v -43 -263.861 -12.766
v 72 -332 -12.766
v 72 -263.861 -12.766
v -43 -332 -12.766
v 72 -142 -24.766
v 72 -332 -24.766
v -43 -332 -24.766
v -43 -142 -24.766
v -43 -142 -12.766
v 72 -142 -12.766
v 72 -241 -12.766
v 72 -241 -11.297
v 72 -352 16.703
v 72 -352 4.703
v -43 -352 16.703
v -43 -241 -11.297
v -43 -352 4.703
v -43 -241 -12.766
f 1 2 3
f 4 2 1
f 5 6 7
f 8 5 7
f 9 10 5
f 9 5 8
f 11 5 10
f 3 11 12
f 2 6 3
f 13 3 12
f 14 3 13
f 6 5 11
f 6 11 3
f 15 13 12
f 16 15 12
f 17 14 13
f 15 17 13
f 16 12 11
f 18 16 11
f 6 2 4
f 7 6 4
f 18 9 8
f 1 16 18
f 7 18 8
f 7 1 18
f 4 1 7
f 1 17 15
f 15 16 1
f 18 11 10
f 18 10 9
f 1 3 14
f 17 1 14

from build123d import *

# Parameters (mm, degrees)
PAD005_DEPTH           = 115
SKETCH004_W            = 115
SKETCH004_H            = 12
PAD004_DEPTH           = 190
FUSION_PLACEMENT_ANGLE = 180


with BuildPart() as body004:
    # CopySketch005 → Pad005 (new body)
    with BuildSketch(Plane.YZ):
        Polygon((-91, -17.296696), (20, 4.703304), (20, 16.703304), (-91, -11.296696), align=None)
    extrude(amount=PAD005_DEPTH)


with BuildPart() as fusion:
    # Sketch004 → Pad004 (new body)
    with BuildSketch(Plane.XZ):
        with Locations((57.5, -18.765628)):
            Rectangle(SKETCH004_W, SKETCH004_H)
    extrude(amount=PAD004_DEPTH)

    # Fusion: union Body004
    add(body004.part)


with BuildPart() as fusion_1:
    # Fusion placement: moved
    add(fusion.part.moved(Location((72, -332, 0))).rotate(Axis((72, -332, 0), (0, 0, 1)), FUSION_PLACEMENT_ANGLE))


solid = fusion_1.part
